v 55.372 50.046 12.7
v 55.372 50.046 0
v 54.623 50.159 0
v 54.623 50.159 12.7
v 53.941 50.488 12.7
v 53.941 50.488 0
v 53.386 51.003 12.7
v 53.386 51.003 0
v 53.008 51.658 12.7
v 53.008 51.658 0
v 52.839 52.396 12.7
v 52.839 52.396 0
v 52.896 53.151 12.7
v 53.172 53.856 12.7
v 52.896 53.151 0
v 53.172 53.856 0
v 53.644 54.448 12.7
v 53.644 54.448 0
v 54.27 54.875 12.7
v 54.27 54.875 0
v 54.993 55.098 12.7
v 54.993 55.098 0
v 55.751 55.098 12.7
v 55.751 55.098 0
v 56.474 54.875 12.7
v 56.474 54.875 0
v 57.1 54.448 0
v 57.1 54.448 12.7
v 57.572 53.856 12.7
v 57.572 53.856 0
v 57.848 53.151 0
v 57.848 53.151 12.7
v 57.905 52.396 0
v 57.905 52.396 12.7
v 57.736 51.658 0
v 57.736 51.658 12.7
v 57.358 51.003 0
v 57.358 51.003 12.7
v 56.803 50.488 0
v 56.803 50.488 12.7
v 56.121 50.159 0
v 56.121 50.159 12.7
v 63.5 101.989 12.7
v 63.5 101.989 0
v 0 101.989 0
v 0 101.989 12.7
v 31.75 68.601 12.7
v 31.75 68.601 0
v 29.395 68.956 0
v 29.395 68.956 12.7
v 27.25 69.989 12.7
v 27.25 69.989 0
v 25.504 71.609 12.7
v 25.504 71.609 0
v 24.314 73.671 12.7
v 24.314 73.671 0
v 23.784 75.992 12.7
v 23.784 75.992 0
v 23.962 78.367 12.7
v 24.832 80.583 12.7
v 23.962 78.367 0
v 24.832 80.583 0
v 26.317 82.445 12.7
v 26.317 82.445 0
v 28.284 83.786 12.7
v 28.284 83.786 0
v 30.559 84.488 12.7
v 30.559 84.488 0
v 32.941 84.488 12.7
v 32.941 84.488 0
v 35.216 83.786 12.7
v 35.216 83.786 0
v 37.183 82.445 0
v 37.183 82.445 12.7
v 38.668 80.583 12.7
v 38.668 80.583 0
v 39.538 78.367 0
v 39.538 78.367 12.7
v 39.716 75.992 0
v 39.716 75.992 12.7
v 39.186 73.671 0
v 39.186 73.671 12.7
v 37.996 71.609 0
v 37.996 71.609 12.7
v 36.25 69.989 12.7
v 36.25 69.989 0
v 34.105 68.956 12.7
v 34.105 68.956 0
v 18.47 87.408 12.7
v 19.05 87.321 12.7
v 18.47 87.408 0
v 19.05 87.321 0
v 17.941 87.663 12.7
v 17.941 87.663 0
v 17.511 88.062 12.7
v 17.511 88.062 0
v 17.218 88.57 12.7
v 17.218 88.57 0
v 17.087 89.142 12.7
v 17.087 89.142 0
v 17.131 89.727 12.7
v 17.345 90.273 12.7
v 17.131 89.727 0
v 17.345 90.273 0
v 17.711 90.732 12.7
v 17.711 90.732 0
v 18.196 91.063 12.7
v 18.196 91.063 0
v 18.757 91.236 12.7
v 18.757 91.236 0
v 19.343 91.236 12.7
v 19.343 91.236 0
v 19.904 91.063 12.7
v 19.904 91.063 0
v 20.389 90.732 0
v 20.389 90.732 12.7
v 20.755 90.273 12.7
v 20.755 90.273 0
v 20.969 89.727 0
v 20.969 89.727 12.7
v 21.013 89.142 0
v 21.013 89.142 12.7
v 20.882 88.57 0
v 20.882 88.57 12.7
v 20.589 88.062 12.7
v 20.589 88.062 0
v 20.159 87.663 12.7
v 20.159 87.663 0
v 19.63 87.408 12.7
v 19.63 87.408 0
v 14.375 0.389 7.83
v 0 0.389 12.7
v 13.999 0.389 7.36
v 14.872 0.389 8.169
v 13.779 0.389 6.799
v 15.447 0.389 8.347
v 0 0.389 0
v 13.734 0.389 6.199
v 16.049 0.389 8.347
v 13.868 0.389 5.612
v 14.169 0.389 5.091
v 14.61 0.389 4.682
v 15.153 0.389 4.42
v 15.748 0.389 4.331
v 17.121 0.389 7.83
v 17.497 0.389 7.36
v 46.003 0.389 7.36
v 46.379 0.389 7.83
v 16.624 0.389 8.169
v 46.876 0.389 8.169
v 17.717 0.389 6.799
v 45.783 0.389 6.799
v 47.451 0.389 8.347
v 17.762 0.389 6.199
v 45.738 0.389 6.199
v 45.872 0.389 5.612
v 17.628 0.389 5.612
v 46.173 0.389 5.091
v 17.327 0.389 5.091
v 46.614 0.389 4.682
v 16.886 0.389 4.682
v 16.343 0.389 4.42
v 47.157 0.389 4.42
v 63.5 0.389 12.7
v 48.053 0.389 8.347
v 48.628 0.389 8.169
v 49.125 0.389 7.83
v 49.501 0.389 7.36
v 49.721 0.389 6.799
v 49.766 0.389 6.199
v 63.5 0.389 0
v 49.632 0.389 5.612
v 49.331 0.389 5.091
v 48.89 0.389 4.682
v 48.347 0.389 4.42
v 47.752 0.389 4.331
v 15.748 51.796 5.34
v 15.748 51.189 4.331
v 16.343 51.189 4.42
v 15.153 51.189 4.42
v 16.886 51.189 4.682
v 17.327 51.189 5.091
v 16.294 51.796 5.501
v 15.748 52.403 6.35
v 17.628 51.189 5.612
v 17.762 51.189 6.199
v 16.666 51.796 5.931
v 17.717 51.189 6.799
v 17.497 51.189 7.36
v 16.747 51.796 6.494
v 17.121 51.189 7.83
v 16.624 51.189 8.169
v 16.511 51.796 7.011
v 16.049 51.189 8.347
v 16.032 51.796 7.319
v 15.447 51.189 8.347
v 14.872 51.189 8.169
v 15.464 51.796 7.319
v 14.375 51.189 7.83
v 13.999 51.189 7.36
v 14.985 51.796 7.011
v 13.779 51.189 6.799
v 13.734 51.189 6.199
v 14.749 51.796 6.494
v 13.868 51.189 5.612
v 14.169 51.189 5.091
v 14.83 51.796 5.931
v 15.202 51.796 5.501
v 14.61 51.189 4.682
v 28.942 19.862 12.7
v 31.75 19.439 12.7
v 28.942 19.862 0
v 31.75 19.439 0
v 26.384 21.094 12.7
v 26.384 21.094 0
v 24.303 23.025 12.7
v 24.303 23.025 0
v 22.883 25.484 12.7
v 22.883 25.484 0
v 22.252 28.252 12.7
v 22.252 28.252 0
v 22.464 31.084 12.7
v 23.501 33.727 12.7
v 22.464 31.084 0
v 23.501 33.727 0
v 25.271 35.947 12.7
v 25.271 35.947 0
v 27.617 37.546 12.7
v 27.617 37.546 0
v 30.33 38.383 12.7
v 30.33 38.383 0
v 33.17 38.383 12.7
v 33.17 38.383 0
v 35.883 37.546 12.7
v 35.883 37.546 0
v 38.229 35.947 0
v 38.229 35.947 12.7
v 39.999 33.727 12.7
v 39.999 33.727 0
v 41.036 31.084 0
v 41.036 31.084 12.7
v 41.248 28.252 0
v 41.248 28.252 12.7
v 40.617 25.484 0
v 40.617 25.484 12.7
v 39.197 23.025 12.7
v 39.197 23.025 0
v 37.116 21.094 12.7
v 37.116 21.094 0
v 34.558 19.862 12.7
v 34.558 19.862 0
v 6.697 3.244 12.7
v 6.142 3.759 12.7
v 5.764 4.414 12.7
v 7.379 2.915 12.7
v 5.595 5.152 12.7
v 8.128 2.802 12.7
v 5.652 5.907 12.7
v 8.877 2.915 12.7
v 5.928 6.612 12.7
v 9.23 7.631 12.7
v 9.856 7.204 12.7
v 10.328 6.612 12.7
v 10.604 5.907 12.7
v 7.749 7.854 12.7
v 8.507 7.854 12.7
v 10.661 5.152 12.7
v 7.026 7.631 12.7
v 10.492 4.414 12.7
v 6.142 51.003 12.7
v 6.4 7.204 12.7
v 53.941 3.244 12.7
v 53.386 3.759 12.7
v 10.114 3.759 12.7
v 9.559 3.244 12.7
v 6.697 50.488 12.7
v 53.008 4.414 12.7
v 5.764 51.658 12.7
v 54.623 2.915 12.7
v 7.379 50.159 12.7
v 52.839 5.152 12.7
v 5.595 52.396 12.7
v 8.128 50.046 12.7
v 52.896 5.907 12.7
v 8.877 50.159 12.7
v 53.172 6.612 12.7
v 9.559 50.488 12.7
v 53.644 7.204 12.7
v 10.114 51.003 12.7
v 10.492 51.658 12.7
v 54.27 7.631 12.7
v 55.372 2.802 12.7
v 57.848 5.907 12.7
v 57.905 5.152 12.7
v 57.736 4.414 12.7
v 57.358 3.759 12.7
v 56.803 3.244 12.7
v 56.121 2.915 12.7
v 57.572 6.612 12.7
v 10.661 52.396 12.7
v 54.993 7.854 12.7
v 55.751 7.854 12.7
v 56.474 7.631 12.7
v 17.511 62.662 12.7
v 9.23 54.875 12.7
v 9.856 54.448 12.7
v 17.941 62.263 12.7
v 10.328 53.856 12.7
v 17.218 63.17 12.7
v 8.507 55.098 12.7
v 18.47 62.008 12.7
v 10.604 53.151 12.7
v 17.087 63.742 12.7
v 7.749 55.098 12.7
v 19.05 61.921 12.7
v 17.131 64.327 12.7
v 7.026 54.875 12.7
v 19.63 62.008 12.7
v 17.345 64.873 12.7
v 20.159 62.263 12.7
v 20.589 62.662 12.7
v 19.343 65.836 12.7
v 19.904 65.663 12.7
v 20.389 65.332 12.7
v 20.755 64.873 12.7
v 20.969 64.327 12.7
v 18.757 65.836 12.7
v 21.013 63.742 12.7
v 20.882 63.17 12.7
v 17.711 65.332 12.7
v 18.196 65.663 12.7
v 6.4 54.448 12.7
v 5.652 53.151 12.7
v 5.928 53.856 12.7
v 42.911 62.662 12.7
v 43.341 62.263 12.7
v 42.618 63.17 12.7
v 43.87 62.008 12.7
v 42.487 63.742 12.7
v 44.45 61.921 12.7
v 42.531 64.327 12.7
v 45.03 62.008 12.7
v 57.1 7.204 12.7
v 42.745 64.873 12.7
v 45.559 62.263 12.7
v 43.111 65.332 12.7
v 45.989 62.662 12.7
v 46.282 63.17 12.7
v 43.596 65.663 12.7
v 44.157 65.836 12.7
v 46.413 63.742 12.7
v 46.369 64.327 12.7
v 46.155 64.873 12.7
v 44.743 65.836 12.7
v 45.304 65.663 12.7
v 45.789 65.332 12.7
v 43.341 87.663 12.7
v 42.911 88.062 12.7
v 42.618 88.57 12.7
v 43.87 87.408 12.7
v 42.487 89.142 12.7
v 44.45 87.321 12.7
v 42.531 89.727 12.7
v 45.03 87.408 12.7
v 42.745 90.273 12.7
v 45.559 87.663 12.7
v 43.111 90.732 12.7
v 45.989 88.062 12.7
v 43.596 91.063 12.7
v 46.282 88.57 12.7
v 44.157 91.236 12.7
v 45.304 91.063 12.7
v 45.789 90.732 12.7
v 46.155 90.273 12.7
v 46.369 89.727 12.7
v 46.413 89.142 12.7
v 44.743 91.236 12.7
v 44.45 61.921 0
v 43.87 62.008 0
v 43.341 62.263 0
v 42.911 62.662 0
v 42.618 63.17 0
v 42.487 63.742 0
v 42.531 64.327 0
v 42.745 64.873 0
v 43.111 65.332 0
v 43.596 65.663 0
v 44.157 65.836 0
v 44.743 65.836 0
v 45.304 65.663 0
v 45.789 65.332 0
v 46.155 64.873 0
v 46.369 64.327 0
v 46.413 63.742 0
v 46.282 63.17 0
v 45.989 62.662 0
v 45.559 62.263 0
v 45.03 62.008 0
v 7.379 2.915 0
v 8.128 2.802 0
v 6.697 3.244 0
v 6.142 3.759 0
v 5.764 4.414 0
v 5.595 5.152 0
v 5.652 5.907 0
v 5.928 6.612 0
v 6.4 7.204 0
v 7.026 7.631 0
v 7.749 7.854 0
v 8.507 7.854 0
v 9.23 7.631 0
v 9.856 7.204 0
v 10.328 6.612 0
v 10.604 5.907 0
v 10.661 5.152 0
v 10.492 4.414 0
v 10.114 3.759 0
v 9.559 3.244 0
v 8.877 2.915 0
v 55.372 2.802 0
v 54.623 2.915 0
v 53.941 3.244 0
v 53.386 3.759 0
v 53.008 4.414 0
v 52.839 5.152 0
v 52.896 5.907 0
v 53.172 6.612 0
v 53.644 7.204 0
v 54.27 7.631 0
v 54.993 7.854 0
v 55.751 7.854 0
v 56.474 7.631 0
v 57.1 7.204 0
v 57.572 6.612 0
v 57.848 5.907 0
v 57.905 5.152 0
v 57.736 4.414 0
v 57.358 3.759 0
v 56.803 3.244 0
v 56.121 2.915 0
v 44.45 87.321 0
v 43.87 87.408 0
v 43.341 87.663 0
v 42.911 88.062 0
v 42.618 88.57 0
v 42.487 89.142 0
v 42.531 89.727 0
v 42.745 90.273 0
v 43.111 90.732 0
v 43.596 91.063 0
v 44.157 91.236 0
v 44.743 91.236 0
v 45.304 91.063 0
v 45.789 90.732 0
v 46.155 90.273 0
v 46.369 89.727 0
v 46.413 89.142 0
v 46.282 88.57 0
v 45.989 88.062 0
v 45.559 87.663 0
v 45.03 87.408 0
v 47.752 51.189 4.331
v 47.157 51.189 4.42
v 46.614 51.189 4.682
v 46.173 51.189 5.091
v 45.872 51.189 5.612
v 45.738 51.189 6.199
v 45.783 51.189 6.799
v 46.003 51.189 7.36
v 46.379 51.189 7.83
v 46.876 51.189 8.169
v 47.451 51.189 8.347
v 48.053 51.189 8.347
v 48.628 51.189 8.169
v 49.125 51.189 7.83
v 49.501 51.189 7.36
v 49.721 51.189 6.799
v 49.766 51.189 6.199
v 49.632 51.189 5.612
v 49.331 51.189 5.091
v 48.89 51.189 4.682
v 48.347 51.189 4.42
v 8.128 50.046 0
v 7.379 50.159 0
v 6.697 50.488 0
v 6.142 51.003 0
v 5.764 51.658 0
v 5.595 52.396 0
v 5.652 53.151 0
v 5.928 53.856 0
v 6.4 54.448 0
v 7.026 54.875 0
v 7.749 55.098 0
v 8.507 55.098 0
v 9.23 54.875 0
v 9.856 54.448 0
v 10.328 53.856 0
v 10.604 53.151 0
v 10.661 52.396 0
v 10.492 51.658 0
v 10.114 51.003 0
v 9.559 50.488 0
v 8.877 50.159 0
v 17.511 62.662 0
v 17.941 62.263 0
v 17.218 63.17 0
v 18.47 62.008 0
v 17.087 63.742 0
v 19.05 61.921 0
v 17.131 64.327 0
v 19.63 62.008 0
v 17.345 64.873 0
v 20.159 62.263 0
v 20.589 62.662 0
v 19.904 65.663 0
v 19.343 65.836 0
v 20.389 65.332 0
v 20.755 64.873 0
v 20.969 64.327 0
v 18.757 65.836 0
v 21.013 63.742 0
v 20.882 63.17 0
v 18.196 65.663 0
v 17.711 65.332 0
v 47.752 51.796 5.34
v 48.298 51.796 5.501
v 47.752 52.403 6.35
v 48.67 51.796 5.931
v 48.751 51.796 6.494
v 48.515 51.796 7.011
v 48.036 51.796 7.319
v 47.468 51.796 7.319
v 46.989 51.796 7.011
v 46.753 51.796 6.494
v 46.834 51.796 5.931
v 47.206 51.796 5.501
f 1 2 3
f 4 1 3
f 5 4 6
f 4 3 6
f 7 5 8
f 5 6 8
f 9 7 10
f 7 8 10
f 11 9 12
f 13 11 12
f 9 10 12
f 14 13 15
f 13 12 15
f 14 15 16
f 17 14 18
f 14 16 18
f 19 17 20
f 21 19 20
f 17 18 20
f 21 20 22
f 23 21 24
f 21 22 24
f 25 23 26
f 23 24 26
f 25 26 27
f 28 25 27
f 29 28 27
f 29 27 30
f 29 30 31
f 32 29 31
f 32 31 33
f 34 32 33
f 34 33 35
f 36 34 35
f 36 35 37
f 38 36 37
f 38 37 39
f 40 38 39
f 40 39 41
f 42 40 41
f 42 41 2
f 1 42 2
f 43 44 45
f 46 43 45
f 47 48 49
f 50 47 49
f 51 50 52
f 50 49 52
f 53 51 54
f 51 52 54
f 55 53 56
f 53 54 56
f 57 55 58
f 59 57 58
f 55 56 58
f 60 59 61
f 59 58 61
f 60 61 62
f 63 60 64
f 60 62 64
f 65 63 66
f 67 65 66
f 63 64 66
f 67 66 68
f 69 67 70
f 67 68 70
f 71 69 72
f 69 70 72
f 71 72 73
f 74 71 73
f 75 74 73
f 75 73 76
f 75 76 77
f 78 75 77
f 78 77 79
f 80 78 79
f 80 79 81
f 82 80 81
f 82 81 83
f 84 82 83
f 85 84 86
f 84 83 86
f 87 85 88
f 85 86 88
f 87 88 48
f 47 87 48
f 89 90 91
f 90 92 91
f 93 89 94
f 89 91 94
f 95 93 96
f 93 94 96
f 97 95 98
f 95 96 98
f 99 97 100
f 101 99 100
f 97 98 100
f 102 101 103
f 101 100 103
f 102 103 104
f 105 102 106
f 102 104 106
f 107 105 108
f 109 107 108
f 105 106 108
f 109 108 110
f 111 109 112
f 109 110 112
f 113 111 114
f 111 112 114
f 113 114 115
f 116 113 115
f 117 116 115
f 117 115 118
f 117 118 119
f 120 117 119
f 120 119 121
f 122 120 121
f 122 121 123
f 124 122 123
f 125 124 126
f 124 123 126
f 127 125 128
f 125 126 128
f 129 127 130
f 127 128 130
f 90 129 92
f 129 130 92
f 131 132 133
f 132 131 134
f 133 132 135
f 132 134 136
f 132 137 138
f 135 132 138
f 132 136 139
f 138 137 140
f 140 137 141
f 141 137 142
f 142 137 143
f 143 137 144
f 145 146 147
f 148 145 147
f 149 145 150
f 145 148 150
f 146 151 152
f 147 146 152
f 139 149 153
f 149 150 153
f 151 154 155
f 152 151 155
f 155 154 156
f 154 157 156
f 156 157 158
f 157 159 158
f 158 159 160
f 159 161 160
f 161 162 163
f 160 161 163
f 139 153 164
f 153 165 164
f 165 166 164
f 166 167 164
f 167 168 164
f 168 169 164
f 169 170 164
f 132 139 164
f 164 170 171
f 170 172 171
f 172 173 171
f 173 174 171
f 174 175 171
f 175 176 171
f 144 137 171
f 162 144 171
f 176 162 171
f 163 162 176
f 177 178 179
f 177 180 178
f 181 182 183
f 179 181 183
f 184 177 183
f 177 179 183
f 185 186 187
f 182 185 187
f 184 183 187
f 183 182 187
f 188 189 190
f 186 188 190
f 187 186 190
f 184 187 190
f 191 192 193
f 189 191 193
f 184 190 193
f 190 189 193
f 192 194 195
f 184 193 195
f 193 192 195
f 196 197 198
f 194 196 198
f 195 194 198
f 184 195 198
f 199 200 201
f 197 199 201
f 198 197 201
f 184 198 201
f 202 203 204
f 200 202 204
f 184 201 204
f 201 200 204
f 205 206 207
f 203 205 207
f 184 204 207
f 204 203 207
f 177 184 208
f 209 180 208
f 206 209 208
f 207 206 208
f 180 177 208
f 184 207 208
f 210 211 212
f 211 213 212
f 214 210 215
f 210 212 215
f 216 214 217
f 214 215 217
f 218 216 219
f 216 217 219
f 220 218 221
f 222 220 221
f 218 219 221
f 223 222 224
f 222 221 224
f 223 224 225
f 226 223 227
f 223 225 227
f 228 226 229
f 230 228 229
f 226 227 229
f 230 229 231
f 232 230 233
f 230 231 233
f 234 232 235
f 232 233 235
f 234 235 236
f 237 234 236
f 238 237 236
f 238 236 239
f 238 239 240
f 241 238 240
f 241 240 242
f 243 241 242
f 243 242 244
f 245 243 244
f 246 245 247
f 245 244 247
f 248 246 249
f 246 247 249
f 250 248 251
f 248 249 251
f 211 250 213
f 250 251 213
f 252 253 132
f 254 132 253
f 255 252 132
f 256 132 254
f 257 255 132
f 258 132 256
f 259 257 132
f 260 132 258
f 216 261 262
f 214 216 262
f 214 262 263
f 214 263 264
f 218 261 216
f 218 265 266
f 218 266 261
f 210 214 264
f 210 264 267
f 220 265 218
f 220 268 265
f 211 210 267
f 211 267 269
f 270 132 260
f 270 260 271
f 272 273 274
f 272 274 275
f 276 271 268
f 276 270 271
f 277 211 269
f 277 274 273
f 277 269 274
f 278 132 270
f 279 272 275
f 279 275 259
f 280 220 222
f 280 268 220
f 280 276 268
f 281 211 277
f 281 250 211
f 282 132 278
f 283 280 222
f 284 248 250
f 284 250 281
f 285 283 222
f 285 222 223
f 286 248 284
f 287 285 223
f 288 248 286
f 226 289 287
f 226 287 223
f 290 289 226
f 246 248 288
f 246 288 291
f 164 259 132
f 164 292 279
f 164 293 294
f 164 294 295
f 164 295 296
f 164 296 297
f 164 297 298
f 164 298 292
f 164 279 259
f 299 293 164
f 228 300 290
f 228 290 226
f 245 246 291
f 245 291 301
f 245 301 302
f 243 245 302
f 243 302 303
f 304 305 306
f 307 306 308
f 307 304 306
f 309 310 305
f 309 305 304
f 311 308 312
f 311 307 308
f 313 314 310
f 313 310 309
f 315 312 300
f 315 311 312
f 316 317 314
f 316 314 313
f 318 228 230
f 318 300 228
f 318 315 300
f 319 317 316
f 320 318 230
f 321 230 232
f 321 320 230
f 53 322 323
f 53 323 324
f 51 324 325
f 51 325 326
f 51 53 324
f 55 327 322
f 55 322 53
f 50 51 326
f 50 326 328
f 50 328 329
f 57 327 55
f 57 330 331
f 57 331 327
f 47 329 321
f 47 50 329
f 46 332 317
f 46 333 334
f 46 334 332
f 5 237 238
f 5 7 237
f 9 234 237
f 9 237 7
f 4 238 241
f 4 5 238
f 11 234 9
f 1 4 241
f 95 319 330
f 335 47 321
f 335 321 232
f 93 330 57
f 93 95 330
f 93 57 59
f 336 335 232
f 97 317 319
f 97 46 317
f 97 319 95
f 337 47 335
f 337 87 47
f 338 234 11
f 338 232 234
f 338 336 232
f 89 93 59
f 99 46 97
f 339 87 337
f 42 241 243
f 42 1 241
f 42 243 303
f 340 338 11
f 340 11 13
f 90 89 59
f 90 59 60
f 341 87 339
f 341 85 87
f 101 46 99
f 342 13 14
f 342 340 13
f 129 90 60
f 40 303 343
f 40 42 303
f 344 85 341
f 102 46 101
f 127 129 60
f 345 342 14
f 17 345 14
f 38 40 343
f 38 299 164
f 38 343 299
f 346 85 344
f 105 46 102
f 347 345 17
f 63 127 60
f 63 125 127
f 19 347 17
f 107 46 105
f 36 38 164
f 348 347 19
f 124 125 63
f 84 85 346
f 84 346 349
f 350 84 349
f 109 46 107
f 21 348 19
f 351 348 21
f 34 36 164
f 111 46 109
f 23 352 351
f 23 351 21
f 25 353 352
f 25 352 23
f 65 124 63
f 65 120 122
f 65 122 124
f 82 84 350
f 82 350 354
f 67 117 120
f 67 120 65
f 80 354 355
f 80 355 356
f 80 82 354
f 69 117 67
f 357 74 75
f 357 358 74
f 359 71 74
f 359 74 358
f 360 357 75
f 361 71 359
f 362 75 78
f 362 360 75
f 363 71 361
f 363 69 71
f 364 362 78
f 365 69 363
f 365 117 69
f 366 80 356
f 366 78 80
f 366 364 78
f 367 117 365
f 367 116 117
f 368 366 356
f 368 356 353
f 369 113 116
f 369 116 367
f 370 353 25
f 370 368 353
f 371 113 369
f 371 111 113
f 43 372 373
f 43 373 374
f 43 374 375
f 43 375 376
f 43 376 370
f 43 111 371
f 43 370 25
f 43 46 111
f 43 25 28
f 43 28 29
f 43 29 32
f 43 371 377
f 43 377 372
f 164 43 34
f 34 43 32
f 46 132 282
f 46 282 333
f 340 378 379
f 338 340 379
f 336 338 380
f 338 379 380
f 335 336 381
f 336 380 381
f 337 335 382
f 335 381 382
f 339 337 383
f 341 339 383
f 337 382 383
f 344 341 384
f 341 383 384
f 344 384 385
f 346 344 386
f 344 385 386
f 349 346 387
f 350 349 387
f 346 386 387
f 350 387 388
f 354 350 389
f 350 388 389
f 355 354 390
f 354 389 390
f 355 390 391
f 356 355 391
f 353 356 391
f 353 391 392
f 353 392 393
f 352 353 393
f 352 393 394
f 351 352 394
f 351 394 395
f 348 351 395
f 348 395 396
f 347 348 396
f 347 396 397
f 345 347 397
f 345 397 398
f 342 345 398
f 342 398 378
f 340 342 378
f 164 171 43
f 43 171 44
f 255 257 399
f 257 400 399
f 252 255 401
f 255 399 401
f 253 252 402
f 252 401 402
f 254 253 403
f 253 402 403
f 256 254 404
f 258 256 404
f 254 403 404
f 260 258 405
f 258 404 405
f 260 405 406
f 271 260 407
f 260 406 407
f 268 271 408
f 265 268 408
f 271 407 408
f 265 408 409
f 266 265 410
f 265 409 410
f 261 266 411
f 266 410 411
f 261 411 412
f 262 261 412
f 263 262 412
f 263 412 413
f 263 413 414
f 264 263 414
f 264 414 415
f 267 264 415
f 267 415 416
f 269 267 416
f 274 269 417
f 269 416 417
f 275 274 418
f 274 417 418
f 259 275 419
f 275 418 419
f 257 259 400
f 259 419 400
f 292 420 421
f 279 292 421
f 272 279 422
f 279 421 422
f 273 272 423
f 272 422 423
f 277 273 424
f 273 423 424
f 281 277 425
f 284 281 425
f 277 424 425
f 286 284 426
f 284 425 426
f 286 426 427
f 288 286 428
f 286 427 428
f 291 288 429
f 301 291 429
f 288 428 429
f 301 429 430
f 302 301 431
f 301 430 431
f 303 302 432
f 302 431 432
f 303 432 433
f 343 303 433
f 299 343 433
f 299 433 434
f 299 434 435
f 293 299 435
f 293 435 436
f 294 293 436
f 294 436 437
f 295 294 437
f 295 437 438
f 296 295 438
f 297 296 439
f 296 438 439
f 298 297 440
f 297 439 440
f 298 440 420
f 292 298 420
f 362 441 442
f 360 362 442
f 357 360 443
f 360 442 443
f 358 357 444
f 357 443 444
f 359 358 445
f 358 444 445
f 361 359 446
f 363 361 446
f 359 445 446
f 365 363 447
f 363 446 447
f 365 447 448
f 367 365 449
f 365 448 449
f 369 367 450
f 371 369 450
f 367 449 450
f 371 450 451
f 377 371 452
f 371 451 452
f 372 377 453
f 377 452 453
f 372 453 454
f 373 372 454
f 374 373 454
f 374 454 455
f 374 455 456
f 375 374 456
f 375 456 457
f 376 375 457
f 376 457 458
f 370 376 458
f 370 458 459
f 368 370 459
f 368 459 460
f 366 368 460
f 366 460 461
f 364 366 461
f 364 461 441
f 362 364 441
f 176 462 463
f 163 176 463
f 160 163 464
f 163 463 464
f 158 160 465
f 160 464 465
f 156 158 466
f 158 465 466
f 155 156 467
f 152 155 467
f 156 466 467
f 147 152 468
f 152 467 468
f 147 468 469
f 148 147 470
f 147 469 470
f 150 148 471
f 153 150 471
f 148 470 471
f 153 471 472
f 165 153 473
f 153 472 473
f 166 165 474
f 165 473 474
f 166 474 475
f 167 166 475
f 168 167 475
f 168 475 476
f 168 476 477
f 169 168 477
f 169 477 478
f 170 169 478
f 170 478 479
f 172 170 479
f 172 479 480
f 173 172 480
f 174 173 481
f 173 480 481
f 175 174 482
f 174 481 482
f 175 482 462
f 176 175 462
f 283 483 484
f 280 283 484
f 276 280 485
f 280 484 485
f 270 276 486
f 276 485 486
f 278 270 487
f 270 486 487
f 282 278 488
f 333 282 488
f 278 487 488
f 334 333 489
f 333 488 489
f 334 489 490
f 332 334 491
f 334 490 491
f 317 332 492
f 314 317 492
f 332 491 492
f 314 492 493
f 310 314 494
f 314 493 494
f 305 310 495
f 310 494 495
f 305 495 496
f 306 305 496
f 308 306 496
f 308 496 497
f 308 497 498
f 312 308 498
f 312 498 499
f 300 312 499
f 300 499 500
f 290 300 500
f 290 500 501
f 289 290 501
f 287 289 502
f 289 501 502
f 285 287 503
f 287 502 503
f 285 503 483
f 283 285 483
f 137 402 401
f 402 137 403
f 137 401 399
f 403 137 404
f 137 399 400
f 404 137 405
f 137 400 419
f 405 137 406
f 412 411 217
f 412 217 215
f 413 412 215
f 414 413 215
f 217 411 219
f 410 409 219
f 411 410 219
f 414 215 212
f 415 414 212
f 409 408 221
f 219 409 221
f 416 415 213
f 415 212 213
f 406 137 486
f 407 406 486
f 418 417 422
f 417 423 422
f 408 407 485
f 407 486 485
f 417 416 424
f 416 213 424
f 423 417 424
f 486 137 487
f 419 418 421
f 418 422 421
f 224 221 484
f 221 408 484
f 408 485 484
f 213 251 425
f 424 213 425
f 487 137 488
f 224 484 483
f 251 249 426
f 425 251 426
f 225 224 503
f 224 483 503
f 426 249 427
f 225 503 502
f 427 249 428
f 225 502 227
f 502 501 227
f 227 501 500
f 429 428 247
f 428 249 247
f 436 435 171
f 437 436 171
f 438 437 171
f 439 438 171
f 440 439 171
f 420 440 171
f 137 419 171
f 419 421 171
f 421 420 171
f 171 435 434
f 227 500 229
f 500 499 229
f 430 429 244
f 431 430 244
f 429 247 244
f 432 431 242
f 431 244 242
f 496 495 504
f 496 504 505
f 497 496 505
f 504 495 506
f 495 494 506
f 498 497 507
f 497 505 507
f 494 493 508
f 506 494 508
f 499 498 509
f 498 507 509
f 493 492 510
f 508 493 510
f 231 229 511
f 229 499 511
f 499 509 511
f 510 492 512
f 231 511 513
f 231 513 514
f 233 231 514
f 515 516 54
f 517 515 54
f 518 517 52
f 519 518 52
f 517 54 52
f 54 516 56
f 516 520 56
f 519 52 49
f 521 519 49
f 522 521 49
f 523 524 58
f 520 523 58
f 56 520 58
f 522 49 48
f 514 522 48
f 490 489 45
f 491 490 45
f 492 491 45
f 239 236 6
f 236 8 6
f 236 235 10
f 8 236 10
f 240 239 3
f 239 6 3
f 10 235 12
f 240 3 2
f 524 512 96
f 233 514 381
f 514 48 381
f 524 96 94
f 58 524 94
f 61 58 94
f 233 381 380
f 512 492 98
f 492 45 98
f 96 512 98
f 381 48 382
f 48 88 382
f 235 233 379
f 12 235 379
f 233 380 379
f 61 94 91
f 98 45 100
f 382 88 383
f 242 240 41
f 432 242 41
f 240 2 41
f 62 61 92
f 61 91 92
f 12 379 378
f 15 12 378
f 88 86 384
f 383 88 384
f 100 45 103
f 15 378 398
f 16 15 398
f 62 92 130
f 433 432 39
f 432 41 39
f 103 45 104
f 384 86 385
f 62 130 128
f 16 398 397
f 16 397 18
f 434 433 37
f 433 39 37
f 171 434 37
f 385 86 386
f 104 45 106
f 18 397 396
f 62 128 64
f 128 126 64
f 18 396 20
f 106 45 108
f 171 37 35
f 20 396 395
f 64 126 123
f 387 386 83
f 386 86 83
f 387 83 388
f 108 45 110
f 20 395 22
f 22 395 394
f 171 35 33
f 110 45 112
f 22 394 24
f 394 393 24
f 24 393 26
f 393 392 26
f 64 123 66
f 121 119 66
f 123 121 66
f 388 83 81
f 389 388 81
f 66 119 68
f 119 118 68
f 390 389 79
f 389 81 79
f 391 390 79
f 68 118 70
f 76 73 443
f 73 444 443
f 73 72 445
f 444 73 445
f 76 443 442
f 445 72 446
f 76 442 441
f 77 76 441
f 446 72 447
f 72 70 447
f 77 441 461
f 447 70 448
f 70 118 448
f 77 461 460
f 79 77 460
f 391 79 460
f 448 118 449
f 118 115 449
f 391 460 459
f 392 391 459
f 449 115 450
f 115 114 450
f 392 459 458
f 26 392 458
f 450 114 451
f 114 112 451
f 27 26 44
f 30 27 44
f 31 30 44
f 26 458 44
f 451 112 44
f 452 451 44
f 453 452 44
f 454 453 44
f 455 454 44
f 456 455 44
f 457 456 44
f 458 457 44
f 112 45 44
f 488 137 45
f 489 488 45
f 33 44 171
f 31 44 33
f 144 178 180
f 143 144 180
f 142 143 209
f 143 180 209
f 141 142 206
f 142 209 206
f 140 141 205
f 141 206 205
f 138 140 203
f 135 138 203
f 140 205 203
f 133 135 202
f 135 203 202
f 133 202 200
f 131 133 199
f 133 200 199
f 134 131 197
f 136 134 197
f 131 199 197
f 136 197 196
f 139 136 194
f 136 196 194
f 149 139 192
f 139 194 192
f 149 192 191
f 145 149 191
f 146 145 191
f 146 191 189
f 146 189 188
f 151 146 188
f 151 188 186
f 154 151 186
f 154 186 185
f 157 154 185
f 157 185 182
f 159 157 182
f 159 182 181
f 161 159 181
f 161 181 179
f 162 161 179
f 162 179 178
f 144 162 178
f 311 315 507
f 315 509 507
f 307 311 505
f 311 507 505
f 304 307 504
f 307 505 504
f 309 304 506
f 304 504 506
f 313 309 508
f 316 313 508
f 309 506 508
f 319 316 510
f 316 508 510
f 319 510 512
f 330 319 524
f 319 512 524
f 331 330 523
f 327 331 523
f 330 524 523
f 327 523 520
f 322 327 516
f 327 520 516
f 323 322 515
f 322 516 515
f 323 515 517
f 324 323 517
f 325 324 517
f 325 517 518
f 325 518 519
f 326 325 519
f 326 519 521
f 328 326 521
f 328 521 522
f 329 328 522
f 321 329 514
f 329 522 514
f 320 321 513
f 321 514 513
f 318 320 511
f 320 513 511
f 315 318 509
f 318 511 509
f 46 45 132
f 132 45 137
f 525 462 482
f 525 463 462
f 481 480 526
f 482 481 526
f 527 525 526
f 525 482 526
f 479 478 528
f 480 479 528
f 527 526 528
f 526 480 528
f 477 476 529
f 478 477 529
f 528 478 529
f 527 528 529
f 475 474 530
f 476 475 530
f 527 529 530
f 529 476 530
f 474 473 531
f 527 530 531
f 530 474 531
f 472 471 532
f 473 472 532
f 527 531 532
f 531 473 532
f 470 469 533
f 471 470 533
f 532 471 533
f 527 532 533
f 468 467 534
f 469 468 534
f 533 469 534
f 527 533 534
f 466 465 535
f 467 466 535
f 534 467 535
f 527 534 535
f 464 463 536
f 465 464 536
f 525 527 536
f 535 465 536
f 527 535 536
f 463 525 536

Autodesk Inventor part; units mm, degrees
ref_plane "YZ Plane" through (0, 0, 0) normal (1, 0, 0) x (0, 1, 0)
ref_plane "XZ Plane" through (0, 0, 0) normal (0, 1, 0) x (-1, 0, 0)
ref_plane "XY Plane" through (0, 0, 0) normal (0, 0, 1) x (1, 0, 0)
sketch "Sketch1" plane through (0, 0, 0) normal (0, 0, 1) x (1, 0, 0)
  line L0 (0, 0.3892) -> (63.5, 0.3892)
  line L1 (63.5, 0.3892) -> (63.5, 101.9892)
  line L2 (63.5, 101.9892) -> (0, 101.9892)
  line L3 (0, 101.9892) -> (0, 0.3892)
  point P0 (0, 0)
  dimension "d0" = 63.5
  dimension "d1" = 101.6
extrude "Extrusion1" add sketch "Sketch1" along normal blind 12.7
hole "Hole15" at (8.128, 5.3422, 12.7) direction (0, 0, -1) diameter 5.08 end through all
hole "Hole16" at (55.372, 5.3422, 12.7) direction (0, 0, -1) diameter 5.08 end through all
hole "Hole17" at (8.128, 52.5862, 12.7) direction (0, 0, -1) diameter 5.08 end through all
hole "Hole18" at (55.372, 52.5862, 12.7) direction (0, 0, -1) diameter 5.08 end through all
hole "Hole19" at (31.75, 76.5892, 12.7) direction (0, 0, -1) diameter 15.9766 end through all
hole "Hole20" at (31.75, 28.9642, 12.7) direction (0, 0, -1) diameter 19.05 end through all
hole "Hole23" at (15.748, 0.3892, 6.35) direction (0, 1, 0) diameter 4.0386 depth 50.8 tip angle 118
hole "Hole24" at (47.752, 0.3892, 6.35) direction (0, 1, 0) diameter 4.0386 depth 50.8 tip angle 118
sketch "Font" plane through (0, 0, 12.7) normal (0, 0, 1) x (1, 0, 0)
  circle A0 centre (31.75, 28.9642) radius 9.525 projected
  circle A1 centre (31.75, 76.5892) radius 7.9883 projected
  circle A2 centre (55.372, 52.5862) radius 2.54 projected
  circle A3 centre (8.128, 52.5862) radius 2.54 projected
  circle A4 centre (55.372, 5.3422) radius 2.54 projected
  circle A5 centre (8.128, 5.3422) radius 2.54 projected
  line L0 (0, 0.3892) -> (0, 101.9892) projected
  line L1 (63.5, 0.3892) -> (0, 0.3892) projected
  line L2 (63.5, 101.9892) -> (63.5, 0.3892) projected
  line L3 (0, 101.9892) -> (63.5, 101.9892) projected
  point P0 (0, 0)
  dimension "d220" = 101.6
  dimension "d221" = 5.08
  dimension "d222" = 15.9766
  dimension "d223" = 19.05
  dimension "d224" = 8.128
  dimension "d225" = 4.953
  dimension "d226" = 28.575
  dimension "d227" = 76.2
  dimension "d228" = 8.128
  dimension "d229" = 4.953
  dimension "d230" = 52.197
  dimension "d231" = 52.197
  dimension "d237" = 31.75
  dimension "d238" = 31.75
sketch "Side" plane through (0, 0.3892, 0) normal (0, -1, 0) x (1, 0, 0)
  circle A0 centre (47.752, 6.35) radius 2.0193 projected
  circle A1 centre (15.748, 6.35) radius 2.0193 projected
  line L0 (63.5, 12.7) -> (0, 12.7) projected
  line L1 (0, 0) -> (0, 12.7) projected
  line L2 (0, 0) -> (63.5, 0) projected
  line L3 (63.5, 0) -> (63.5, 12.7) projected
  dimension "d232" = 15.748
  dimension "d233" = 12.7
  dimension "d234" = 15.748
  dimension "d235" = 6.35
  dimension "d236" = 6.35
hole "Hole25" at (19.05, 89.2892, 12.7) direction (0, 0, -1) diameter 3.937 end through all
hole "Hole26" at (19.05, 63.8892, 12.7) direction (0, 0, -1) diameter 3.937 end through all
hole "Hole27" at (44.45, 89.2892, 12.7) direction (0, 0, -1) diameter 3.937 end through all
hole "Hole28" at (44.45, 63.8892, 12.7) direction (0, 0, -1) diameter 3.937 end through all
sketch "Sketch5" plane through (0, 0, 12.7) normal (0, 0, 1) x (1, 0, 0)
  circle A0 centre (44.45, 63.8892) radius 1.9685 projected
  circle A1 centre (44.45, 89.2892) radius 1.9685 projected
  circle A2 centre (19.05, 63.8892) radius 1.9685 projected
  circle A3 centre (19.05, 89.2892) radius 1.9685 projected
  circle A4 centre (31.75, 28.9642) radius 9.525 projected
  circle A5 centre (31.75, 76.5892) radius 7.9883 projected
  circle A6 centre (55.372, 52.5862) radius 2.54 projected
  circle A7 centre (8.128, 52.5862) radius 2.54 projected
  circle A8 centre (55.372, 5.3422) radius 2.54 projected
  circle A9 centre (8.128, 5.3422) radius 2.54 projected
  line L0 (0, 0.3892) -> (0, 101.9892) projected
  line L1 (63.5, 0.3892) -> (0, 0.3892) projected
  line L2 (63.5, 101.9892) -> (63.5, 0.3892) projected
  line L3 (0, 101.9892) -> (63.5, 101.9892) projected
  point P0 (0, 0)
  dimension "d275" = 63.5
  dimension "d276" = 19.05
  dimension "d277" = 44.45
  dimension "d278" = 88.9
properties part number "ytowerv1"
